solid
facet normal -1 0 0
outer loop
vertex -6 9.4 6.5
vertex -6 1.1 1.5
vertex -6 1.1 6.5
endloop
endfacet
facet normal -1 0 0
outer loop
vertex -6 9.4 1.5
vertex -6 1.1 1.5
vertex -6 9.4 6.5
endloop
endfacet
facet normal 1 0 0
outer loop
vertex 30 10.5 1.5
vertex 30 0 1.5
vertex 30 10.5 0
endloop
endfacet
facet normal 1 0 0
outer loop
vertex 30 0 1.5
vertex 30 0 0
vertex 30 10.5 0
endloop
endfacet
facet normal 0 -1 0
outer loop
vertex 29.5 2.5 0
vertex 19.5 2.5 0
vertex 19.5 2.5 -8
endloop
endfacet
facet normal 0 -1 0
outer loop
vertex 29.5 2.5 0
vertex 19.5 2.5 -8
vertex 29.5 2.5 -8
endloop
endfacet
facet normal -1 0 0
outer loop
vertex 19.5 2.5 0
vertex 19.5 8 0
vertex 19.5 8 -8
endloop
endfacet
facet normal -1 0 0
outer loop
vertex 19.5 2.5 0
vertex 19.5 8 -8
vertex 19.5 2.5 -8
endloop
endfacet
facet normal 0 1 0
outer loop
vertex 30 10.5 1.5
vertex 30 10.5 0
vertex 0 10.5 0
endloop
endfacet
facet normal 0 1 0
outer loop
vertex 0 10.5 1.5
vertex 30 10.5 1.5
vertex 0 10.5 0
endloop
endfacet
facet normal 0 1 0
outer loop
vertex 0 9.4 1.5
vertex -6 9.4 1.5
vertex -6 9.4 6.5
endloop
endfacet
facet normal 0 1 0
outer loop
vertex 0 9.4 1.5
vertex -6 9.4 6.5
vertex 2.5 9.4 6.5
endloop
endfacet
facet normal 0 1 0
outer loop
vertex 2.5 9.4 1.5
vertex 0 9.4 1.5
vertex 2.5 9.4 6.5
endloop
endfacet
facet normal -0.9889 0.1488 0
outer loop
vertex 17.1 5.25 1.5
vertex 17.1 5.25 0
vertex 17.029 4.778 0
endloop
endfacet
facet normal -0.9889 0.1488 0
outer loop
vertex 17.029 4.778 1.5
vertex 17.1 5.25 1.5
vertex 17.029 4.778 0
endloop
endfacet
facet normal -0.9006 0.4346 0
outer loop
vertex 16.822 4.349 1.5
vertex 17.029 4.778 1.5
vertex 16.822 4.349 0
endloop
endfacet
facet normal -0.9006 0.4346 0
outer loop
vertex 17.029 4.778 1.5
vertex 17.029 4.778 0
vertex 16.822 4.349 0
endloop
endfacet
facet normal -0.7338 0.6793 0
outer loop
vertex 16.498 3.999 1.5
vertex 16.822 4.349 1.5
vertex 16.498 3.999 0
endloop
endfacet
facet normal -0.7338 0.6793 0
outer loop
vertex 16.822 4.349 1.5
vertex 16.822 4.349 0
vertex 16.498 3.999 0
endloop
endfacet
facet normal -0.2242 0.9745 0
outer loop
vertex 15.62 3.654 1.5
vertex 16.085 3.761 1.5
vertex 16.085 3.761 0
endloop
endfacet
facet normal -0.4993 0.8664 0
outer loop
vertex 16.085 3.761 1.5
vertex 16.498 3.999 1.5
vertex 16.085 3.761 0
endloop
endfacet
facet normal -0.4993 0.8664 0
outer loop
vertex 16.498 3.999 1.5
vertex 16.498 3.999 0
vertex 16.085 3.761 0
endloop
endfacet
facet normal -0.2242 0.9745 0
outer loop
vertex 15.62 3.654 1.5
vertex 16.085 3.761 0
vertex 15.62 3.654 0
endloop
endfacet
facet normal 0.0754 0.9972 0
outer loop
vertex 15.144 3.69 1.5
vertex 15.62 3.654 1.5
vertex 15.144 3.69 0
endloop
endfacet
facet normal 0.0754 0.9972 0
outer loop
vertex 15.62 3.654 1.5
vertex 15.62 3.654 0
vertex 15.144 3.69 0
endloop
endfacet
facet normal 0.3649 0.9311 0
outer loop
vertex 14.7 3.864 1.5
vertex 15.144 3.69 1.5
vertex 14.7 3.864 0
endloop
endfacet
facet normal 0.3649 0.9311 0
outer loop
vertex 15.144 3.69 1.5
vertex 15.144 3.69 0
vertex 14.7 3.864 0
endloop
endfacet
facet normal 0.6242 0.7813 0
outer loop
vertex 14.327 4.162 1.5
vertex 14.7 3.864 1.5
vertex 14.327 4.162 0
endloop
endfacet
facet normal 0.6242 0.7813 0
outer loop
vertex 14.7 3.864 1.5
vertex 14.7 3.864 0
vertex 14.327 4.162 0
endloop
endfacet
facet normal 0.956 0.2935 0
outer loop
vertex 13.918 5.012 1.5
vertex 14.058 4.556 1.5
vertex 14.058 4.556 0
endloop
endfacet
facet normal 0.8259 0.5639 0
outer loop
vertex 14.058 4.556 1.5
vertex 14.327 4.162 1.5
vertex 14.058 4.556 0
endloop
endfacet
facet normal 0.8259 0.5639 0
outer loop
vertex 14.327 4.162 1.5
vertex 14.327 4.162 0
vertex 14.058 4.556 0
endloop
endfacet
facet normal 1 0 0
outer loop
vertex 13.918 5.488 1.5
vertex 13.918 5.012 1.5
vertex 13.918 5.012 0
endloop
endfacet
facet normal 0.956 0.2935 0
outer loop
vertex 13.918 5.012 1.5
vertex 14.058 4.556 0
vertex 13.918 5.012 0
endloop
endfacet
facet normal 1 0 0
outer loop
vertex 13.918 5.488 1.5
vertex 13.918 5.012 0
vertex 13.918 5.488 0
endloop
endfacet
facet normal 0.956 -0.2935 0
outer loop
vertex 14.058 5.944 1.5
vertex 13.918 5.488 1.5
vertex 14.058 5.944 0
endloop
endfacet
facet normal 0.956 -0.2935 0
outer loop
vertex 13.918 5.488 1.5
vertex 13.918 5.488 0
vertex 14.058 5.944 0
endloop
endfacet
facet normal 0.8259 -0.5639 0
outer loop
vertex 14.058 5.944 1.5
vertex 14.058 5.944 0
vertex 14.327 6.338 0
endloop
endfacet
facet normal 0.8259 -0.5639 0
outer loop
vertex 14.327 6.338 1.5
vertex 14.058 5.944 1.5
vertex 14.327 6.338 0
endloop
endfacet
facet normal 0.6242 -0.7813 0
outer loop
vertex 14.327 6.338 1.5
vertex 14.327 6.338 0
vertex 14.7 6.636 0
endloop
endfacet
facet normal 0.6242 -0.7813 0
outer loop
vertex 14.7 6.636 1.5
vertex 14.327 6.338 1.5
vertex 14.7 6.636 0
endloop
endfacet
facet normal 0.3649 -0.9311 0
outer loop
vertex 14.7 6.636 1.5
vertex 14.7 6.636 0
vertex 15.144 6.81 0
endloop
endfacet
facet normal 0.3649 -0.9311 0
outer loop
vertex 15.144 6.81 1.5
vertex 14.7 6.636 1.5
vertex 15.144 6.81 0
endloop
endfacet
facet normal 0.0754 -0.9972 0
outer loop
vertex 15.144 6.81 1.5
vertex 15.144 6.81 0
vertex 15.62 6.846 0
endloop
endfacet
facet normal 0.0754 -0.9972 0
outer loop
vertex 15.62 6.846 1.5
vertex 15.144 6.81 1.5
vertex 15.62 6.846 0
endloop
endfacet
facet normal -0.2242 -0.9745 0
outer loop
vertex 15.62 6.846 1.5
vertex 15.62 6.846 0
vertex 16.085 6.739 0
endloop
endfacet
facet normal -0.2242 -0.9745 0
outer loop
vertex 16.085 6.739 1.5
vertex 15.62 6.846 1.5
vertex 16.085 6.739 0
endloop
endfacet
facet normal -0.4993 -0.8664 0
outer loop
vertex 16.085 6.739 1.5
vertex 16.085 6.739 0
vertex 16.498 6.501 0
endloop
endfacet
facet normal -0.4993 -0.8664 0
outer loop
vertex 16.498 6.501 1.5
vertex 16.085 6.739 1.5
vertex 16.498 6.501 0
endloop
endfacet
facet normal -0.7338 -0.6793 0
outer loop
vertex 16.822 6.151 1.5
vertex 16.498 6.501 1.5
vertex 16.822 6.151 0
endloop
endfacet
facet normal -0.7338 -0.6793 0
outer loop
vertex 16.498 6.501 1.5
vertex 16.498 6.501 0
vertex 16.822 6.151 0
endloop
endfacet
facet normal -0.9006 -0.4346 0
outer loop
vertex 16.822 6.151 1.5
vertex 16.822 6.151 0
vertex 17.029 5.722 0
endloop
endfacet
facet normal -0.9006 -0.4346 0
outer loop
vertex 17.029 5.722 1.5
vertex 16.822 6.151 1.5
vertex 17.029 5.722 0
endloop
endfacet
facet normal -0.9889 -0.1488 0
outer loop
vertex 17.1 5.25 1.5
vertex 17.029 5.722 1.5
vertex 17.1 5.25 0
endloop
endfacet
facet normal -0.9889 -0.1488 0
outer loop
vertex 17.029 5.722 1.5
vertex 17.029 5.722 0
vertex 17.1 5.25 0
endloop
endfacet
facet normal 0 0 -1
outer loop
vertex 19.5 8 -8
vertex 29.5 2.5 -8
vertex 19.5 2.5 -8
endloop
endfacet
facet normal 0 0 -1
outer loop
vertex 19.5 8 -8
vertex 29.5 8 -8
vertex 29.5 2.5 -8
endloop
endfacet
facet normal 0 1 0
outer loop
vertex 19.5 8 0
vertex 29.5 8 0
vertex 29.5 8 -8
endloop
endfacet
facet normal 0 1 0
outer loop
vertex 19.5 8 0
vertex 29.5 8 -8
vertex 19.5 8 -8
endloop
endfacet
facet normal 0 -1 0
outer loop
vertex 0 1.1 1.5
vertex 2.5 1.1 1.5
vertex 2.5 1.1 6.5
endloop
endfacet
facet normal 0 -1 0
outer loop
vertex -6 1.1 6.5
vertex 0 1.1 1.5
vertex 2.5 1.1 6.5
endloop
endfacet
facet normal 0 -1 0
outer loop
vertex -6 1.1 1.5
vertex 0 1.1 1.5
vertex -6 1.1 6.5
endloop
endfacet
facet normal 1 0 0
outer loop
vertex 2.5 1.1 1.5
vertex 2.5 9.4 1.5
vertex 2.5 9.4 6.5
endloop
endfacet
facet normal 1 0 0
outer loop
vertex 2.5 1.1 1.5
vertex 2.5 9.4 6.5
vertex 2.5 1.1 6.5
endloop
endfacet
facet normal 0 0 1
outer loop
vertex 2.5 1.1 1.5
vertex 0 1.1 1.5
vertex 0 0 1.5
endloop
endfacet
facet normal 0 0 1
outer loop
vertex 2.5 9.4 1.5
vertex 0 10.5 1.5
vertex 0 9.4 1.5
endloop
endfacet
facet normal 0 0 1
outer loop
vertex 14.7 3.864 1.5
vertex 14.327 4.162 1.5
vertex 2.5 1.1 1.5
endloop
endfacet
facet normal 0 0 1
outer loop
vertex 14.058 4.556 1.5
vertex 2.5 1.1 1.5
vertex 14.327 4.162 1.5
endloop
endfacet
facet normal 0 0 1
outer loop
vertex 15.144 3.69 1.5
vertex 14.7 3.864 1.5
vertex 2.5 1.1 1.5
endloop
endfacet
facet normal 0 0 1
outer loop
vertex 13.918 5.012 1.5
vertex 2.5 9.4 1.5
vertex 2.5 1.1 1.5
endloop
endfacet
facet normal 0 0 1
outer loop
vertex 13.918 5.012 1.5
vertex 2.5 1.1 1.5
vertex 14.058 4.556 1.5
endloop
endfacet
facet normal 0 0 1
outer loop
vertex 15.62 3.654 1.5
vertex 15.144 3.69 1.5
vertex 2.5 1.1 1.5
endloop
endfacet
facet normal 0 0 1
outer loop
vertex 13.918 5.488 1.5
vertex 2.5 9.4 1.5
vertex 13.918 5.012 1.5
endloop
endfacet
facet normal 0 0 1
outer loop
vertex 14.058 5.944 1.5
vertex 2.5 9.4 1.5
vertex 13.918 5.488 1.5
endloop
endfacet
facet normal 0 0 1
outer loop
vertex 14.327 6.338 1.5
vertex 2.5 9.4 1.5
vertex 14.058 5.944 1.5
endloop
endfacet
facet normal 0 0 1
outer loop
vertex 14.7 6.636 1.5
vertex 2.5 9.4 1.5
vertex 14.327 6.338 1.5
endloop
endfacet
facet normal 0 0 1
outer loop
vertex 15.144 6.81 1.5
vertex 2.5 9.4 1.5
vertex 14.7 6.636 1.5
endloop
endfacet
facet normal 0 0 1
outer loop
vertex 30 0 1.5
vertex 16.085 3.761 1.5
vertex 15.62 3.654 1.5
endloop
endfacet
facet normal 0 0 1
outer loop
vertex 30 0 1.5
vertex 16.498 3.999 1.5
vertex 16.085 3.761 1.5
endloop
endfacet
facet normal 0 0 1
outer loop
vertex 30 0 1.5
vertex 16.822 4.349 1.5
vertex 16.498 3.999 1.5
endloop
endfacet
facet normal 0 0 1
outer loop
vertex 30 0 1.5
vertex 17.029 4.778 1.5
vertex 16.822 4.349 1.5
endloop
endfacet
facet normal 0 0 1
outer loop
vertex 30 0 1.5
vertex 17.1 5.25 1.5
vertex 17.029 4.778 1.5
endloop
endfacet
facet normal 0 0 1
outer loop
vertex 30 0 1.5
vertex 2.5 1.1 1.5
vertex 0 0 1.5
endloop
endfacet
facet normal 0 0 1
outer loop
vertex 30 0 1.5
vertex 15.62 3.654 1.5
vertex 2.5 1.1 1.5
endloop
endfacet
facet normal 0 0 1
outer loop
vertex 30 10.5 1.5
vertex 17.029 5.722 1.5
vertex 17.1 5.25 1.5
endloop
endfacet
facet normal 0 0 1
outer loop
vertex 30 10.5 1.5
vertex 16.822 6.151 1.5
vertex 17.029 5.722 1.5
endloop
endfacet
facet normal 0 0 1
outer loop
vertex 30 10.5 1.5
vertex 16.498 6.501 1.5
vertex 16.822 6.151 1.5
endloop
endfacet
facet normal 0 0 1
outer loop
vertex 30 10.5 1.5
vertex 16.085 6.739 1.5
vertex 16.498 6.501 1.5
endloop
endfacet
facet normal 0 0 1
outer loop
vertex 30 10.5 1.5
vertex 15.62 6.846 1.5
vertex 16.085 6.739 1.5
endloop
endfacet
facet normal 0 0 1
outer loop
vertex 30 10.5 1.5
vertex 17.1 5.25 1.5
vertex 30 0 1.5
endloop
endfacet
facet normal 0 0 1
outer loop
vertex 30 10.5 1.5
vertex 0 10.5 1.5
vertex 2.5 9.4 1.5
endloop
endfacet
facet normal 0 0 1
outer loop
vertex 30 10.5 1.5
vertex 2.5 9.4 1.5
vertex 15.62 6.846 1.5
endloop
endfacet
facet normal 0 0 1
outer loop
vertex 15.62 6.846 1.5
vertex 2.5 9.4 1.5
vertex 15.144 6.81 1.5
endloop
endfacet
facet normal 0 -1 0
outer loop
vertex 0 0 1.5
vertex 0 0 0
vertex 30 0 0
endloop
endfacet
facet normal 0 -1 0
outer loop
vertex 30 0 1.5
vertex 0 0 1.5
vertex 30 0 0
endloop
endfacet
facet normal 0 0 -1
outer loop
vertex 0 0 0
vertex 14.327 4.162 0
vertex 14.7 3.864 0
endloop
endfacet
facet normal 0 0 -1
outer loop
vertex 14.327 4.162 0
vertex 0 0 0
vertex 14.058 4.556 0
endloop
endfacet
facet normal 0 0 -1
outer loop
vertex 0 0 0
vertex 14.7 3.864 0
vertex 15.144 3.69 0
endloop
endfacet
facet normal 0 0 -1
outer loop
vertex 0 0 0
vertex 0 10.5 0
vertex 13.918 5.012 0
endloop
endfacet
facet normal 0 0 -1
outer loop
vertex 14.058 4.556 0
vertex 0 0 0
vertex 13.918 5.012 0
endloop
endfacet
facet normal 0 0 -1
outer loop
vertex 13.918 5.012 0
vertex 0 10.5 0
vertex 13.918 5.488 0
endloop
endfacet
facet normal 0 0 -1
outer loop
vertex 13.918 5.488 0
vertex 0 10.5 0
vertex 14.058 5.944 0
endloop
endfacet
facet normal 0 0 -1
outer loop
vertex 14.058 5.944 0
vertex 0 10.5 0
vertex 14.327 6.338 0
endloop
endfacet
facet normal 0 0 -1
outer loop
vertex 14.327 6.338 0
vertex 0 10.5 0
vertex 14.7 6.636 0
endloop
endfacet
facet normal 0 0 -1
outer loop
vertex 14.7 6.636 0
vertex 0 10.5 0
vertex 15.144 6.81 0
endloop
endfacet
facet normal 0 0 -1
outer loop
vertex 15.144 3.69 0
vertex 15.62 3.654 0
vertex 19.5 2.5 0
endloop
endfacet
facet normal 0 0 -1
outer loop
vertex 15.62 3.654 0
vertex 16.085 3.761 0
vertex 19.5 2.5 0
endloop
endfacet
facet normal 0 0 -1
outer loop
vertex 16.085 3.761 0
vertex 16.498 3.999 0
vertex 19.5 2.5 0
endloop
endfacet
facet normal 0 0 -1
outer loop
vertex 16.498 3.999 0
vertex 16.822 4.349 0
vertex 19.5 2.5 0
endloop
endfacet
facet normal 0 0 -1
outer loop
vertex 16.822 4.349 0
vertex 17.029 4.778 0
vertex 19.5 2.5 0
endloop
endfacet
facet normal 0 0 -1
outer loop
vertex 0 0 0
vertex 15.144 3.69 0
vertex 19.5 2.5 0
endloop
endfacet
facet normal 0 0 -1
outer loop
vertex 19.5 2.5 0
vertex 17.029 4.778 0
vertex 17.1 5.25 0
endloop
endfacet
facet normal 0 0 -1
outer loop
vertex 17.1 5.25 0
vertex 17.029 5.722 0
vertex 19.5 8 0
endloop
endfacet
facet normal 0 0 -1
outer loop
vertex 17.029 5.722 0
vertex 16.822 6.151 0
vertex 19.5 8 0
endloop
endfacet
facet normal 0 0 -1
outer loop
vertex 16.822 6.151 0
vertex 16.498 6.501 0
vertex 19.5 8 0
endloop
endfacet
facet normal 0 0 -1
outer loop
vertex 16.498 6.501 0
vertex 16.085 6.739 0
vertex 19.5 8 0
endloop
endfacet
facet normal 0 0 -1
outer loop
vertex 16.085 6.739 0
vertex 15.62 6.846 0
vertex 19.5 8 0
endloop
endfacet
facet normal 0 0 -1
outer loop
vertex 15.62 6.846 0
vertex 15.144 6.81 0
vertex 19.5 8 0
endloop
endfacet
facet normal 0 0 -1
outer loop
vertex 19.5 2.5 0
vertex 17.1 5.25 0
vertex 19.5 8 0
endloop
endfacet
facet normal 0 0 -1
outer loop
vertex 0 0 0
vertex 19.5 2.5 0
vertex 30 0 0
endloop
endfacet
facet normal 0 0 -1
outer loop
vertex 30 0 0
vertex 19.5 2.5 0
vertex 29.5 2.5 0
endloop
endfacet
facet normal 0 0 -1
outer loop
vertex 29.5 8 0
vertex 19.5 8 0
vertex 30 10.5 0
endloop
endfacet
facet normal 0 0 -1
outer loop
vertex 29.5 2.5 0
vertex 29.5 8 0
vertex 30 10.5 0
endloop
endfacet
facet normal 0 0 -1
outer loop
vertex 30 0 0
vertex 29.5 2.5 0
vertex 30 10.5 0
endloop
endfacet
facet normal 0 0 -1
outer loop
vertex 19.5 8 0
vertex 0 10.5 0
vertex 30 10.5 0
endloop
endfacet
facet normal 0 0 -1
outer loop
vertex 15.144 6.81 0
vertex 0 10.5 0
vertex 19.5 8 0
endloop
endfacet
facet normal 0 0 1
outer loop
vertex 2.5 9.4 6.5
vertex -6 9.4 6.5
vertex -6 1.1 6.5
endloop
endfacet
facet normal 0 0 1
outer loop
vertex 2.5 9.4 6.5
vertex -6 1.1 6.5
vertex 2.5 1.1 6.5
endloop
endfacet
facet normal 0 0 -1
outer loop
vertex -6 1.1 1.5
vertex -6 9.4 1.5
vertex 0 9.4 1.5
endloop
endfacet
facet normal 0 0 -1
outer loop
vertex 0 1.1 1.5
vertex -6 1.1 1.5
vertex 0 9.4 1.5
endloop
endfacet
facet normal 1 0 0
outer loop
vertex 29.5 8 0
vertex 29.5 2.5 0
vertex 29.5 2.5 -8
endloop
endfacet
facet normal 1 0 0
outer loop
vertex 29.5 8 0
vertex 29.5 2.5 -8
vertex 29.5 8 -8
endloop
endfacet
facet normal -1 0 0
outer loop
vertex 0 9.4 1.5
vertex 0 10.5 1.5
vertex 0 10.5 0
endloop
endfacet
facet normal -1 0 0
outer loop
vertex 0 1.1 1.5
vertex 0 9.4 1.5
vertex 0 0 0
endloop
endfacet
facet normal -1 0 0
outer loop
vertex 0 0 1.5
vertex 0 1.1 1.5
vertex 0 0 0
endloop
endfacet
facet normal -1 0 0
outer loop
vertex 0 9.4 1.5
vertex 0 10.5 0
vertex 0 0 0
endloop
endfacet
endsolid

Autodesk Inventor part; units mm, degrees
ref_plane "YZ Plane" through (0, 0, 0) normal (1, 0, 0) x (0, 1, 0)
ref_plane "XZ Plane" through (0, 0, 0) normal (0, 1, 0) x (-1, 0, 0)
ref_plane "XY Plane" through (0, 0, 0) normal (0, 0, 1) x (1, 0, 0)
sketch "Sketch1" plane through (0, 0, 0) normal (0, 0, 1) x (1, 0, 0)
  line L0 (0, 0) -> (30, 0)
  line L1 (30, 0) -> (30, 10.5)
  line L2 (30, 10.5) -> (0, 10.5)
  line L3 (0, 10.5) -> (0, 0)
  circle A0 centre (15.5, 5.25) radius 1.6
  point P0 (0, 5.25)
  dimension "d0" = 30
  dimension "d1" = 10.5
  dimension "d2" = 3.2
  dimension "d3" = 14.5
extrude "Extrusion1" add sketch "Sketch1" along normal blind 1.5
sketch "Sketch2" plane through (0, 0, 1.5) normal (0, 0, 1) x (1, 0, 0)
  line L0 (0, 0) -> (0, 10.5) projected
  line L1 (30, 10.5) -> (30, 0) projected
  line L2 (-6, 9.4) -> (2.5, 9.4)
  line L3 (2.5, 9.4) -> (2.5, 1.1)
  line L4 (2.5, 1.1) -> (-6, 1.1)
  line L5 (-6, 1.1) -> (-6, 9.4)
  point P0 (-6, 5.25)
  point P1 (0, 5.25)
  dimension "d6" = 36
  dimension "d7" = 8.3
  dimension "d8" = 2.5
extrude "Extrusion2" add sketch "Sketch2" along normal blind 5
sketch "Sketch3" plane through (0, 0, 0) normal (0, 0, -1) x (-1, 0, 0)
  line L0 (-30, 0) -> (-30, 10.5) projected
  line L1 (-29.5, 8) -> (-19.5, 8)
  line L2 (-19.5, 8) -> (-19.5, 2.5)
  line L3 (-19.5, 2.5) -> (-29.5, 2.5)
  line L4 (-29.5, 2.5) -> (-29.5, 8)
  point P0 (-29.5, 5.25)
  point P1 (-30, 5.25)
  dimension "d11" = 10
  dimension "d12" = 5.5
  dimension "d13" = 0.5
extrude "Extrusion3" add sketch "Sketch3" along normal blind 8
properties part number "Sensor"
